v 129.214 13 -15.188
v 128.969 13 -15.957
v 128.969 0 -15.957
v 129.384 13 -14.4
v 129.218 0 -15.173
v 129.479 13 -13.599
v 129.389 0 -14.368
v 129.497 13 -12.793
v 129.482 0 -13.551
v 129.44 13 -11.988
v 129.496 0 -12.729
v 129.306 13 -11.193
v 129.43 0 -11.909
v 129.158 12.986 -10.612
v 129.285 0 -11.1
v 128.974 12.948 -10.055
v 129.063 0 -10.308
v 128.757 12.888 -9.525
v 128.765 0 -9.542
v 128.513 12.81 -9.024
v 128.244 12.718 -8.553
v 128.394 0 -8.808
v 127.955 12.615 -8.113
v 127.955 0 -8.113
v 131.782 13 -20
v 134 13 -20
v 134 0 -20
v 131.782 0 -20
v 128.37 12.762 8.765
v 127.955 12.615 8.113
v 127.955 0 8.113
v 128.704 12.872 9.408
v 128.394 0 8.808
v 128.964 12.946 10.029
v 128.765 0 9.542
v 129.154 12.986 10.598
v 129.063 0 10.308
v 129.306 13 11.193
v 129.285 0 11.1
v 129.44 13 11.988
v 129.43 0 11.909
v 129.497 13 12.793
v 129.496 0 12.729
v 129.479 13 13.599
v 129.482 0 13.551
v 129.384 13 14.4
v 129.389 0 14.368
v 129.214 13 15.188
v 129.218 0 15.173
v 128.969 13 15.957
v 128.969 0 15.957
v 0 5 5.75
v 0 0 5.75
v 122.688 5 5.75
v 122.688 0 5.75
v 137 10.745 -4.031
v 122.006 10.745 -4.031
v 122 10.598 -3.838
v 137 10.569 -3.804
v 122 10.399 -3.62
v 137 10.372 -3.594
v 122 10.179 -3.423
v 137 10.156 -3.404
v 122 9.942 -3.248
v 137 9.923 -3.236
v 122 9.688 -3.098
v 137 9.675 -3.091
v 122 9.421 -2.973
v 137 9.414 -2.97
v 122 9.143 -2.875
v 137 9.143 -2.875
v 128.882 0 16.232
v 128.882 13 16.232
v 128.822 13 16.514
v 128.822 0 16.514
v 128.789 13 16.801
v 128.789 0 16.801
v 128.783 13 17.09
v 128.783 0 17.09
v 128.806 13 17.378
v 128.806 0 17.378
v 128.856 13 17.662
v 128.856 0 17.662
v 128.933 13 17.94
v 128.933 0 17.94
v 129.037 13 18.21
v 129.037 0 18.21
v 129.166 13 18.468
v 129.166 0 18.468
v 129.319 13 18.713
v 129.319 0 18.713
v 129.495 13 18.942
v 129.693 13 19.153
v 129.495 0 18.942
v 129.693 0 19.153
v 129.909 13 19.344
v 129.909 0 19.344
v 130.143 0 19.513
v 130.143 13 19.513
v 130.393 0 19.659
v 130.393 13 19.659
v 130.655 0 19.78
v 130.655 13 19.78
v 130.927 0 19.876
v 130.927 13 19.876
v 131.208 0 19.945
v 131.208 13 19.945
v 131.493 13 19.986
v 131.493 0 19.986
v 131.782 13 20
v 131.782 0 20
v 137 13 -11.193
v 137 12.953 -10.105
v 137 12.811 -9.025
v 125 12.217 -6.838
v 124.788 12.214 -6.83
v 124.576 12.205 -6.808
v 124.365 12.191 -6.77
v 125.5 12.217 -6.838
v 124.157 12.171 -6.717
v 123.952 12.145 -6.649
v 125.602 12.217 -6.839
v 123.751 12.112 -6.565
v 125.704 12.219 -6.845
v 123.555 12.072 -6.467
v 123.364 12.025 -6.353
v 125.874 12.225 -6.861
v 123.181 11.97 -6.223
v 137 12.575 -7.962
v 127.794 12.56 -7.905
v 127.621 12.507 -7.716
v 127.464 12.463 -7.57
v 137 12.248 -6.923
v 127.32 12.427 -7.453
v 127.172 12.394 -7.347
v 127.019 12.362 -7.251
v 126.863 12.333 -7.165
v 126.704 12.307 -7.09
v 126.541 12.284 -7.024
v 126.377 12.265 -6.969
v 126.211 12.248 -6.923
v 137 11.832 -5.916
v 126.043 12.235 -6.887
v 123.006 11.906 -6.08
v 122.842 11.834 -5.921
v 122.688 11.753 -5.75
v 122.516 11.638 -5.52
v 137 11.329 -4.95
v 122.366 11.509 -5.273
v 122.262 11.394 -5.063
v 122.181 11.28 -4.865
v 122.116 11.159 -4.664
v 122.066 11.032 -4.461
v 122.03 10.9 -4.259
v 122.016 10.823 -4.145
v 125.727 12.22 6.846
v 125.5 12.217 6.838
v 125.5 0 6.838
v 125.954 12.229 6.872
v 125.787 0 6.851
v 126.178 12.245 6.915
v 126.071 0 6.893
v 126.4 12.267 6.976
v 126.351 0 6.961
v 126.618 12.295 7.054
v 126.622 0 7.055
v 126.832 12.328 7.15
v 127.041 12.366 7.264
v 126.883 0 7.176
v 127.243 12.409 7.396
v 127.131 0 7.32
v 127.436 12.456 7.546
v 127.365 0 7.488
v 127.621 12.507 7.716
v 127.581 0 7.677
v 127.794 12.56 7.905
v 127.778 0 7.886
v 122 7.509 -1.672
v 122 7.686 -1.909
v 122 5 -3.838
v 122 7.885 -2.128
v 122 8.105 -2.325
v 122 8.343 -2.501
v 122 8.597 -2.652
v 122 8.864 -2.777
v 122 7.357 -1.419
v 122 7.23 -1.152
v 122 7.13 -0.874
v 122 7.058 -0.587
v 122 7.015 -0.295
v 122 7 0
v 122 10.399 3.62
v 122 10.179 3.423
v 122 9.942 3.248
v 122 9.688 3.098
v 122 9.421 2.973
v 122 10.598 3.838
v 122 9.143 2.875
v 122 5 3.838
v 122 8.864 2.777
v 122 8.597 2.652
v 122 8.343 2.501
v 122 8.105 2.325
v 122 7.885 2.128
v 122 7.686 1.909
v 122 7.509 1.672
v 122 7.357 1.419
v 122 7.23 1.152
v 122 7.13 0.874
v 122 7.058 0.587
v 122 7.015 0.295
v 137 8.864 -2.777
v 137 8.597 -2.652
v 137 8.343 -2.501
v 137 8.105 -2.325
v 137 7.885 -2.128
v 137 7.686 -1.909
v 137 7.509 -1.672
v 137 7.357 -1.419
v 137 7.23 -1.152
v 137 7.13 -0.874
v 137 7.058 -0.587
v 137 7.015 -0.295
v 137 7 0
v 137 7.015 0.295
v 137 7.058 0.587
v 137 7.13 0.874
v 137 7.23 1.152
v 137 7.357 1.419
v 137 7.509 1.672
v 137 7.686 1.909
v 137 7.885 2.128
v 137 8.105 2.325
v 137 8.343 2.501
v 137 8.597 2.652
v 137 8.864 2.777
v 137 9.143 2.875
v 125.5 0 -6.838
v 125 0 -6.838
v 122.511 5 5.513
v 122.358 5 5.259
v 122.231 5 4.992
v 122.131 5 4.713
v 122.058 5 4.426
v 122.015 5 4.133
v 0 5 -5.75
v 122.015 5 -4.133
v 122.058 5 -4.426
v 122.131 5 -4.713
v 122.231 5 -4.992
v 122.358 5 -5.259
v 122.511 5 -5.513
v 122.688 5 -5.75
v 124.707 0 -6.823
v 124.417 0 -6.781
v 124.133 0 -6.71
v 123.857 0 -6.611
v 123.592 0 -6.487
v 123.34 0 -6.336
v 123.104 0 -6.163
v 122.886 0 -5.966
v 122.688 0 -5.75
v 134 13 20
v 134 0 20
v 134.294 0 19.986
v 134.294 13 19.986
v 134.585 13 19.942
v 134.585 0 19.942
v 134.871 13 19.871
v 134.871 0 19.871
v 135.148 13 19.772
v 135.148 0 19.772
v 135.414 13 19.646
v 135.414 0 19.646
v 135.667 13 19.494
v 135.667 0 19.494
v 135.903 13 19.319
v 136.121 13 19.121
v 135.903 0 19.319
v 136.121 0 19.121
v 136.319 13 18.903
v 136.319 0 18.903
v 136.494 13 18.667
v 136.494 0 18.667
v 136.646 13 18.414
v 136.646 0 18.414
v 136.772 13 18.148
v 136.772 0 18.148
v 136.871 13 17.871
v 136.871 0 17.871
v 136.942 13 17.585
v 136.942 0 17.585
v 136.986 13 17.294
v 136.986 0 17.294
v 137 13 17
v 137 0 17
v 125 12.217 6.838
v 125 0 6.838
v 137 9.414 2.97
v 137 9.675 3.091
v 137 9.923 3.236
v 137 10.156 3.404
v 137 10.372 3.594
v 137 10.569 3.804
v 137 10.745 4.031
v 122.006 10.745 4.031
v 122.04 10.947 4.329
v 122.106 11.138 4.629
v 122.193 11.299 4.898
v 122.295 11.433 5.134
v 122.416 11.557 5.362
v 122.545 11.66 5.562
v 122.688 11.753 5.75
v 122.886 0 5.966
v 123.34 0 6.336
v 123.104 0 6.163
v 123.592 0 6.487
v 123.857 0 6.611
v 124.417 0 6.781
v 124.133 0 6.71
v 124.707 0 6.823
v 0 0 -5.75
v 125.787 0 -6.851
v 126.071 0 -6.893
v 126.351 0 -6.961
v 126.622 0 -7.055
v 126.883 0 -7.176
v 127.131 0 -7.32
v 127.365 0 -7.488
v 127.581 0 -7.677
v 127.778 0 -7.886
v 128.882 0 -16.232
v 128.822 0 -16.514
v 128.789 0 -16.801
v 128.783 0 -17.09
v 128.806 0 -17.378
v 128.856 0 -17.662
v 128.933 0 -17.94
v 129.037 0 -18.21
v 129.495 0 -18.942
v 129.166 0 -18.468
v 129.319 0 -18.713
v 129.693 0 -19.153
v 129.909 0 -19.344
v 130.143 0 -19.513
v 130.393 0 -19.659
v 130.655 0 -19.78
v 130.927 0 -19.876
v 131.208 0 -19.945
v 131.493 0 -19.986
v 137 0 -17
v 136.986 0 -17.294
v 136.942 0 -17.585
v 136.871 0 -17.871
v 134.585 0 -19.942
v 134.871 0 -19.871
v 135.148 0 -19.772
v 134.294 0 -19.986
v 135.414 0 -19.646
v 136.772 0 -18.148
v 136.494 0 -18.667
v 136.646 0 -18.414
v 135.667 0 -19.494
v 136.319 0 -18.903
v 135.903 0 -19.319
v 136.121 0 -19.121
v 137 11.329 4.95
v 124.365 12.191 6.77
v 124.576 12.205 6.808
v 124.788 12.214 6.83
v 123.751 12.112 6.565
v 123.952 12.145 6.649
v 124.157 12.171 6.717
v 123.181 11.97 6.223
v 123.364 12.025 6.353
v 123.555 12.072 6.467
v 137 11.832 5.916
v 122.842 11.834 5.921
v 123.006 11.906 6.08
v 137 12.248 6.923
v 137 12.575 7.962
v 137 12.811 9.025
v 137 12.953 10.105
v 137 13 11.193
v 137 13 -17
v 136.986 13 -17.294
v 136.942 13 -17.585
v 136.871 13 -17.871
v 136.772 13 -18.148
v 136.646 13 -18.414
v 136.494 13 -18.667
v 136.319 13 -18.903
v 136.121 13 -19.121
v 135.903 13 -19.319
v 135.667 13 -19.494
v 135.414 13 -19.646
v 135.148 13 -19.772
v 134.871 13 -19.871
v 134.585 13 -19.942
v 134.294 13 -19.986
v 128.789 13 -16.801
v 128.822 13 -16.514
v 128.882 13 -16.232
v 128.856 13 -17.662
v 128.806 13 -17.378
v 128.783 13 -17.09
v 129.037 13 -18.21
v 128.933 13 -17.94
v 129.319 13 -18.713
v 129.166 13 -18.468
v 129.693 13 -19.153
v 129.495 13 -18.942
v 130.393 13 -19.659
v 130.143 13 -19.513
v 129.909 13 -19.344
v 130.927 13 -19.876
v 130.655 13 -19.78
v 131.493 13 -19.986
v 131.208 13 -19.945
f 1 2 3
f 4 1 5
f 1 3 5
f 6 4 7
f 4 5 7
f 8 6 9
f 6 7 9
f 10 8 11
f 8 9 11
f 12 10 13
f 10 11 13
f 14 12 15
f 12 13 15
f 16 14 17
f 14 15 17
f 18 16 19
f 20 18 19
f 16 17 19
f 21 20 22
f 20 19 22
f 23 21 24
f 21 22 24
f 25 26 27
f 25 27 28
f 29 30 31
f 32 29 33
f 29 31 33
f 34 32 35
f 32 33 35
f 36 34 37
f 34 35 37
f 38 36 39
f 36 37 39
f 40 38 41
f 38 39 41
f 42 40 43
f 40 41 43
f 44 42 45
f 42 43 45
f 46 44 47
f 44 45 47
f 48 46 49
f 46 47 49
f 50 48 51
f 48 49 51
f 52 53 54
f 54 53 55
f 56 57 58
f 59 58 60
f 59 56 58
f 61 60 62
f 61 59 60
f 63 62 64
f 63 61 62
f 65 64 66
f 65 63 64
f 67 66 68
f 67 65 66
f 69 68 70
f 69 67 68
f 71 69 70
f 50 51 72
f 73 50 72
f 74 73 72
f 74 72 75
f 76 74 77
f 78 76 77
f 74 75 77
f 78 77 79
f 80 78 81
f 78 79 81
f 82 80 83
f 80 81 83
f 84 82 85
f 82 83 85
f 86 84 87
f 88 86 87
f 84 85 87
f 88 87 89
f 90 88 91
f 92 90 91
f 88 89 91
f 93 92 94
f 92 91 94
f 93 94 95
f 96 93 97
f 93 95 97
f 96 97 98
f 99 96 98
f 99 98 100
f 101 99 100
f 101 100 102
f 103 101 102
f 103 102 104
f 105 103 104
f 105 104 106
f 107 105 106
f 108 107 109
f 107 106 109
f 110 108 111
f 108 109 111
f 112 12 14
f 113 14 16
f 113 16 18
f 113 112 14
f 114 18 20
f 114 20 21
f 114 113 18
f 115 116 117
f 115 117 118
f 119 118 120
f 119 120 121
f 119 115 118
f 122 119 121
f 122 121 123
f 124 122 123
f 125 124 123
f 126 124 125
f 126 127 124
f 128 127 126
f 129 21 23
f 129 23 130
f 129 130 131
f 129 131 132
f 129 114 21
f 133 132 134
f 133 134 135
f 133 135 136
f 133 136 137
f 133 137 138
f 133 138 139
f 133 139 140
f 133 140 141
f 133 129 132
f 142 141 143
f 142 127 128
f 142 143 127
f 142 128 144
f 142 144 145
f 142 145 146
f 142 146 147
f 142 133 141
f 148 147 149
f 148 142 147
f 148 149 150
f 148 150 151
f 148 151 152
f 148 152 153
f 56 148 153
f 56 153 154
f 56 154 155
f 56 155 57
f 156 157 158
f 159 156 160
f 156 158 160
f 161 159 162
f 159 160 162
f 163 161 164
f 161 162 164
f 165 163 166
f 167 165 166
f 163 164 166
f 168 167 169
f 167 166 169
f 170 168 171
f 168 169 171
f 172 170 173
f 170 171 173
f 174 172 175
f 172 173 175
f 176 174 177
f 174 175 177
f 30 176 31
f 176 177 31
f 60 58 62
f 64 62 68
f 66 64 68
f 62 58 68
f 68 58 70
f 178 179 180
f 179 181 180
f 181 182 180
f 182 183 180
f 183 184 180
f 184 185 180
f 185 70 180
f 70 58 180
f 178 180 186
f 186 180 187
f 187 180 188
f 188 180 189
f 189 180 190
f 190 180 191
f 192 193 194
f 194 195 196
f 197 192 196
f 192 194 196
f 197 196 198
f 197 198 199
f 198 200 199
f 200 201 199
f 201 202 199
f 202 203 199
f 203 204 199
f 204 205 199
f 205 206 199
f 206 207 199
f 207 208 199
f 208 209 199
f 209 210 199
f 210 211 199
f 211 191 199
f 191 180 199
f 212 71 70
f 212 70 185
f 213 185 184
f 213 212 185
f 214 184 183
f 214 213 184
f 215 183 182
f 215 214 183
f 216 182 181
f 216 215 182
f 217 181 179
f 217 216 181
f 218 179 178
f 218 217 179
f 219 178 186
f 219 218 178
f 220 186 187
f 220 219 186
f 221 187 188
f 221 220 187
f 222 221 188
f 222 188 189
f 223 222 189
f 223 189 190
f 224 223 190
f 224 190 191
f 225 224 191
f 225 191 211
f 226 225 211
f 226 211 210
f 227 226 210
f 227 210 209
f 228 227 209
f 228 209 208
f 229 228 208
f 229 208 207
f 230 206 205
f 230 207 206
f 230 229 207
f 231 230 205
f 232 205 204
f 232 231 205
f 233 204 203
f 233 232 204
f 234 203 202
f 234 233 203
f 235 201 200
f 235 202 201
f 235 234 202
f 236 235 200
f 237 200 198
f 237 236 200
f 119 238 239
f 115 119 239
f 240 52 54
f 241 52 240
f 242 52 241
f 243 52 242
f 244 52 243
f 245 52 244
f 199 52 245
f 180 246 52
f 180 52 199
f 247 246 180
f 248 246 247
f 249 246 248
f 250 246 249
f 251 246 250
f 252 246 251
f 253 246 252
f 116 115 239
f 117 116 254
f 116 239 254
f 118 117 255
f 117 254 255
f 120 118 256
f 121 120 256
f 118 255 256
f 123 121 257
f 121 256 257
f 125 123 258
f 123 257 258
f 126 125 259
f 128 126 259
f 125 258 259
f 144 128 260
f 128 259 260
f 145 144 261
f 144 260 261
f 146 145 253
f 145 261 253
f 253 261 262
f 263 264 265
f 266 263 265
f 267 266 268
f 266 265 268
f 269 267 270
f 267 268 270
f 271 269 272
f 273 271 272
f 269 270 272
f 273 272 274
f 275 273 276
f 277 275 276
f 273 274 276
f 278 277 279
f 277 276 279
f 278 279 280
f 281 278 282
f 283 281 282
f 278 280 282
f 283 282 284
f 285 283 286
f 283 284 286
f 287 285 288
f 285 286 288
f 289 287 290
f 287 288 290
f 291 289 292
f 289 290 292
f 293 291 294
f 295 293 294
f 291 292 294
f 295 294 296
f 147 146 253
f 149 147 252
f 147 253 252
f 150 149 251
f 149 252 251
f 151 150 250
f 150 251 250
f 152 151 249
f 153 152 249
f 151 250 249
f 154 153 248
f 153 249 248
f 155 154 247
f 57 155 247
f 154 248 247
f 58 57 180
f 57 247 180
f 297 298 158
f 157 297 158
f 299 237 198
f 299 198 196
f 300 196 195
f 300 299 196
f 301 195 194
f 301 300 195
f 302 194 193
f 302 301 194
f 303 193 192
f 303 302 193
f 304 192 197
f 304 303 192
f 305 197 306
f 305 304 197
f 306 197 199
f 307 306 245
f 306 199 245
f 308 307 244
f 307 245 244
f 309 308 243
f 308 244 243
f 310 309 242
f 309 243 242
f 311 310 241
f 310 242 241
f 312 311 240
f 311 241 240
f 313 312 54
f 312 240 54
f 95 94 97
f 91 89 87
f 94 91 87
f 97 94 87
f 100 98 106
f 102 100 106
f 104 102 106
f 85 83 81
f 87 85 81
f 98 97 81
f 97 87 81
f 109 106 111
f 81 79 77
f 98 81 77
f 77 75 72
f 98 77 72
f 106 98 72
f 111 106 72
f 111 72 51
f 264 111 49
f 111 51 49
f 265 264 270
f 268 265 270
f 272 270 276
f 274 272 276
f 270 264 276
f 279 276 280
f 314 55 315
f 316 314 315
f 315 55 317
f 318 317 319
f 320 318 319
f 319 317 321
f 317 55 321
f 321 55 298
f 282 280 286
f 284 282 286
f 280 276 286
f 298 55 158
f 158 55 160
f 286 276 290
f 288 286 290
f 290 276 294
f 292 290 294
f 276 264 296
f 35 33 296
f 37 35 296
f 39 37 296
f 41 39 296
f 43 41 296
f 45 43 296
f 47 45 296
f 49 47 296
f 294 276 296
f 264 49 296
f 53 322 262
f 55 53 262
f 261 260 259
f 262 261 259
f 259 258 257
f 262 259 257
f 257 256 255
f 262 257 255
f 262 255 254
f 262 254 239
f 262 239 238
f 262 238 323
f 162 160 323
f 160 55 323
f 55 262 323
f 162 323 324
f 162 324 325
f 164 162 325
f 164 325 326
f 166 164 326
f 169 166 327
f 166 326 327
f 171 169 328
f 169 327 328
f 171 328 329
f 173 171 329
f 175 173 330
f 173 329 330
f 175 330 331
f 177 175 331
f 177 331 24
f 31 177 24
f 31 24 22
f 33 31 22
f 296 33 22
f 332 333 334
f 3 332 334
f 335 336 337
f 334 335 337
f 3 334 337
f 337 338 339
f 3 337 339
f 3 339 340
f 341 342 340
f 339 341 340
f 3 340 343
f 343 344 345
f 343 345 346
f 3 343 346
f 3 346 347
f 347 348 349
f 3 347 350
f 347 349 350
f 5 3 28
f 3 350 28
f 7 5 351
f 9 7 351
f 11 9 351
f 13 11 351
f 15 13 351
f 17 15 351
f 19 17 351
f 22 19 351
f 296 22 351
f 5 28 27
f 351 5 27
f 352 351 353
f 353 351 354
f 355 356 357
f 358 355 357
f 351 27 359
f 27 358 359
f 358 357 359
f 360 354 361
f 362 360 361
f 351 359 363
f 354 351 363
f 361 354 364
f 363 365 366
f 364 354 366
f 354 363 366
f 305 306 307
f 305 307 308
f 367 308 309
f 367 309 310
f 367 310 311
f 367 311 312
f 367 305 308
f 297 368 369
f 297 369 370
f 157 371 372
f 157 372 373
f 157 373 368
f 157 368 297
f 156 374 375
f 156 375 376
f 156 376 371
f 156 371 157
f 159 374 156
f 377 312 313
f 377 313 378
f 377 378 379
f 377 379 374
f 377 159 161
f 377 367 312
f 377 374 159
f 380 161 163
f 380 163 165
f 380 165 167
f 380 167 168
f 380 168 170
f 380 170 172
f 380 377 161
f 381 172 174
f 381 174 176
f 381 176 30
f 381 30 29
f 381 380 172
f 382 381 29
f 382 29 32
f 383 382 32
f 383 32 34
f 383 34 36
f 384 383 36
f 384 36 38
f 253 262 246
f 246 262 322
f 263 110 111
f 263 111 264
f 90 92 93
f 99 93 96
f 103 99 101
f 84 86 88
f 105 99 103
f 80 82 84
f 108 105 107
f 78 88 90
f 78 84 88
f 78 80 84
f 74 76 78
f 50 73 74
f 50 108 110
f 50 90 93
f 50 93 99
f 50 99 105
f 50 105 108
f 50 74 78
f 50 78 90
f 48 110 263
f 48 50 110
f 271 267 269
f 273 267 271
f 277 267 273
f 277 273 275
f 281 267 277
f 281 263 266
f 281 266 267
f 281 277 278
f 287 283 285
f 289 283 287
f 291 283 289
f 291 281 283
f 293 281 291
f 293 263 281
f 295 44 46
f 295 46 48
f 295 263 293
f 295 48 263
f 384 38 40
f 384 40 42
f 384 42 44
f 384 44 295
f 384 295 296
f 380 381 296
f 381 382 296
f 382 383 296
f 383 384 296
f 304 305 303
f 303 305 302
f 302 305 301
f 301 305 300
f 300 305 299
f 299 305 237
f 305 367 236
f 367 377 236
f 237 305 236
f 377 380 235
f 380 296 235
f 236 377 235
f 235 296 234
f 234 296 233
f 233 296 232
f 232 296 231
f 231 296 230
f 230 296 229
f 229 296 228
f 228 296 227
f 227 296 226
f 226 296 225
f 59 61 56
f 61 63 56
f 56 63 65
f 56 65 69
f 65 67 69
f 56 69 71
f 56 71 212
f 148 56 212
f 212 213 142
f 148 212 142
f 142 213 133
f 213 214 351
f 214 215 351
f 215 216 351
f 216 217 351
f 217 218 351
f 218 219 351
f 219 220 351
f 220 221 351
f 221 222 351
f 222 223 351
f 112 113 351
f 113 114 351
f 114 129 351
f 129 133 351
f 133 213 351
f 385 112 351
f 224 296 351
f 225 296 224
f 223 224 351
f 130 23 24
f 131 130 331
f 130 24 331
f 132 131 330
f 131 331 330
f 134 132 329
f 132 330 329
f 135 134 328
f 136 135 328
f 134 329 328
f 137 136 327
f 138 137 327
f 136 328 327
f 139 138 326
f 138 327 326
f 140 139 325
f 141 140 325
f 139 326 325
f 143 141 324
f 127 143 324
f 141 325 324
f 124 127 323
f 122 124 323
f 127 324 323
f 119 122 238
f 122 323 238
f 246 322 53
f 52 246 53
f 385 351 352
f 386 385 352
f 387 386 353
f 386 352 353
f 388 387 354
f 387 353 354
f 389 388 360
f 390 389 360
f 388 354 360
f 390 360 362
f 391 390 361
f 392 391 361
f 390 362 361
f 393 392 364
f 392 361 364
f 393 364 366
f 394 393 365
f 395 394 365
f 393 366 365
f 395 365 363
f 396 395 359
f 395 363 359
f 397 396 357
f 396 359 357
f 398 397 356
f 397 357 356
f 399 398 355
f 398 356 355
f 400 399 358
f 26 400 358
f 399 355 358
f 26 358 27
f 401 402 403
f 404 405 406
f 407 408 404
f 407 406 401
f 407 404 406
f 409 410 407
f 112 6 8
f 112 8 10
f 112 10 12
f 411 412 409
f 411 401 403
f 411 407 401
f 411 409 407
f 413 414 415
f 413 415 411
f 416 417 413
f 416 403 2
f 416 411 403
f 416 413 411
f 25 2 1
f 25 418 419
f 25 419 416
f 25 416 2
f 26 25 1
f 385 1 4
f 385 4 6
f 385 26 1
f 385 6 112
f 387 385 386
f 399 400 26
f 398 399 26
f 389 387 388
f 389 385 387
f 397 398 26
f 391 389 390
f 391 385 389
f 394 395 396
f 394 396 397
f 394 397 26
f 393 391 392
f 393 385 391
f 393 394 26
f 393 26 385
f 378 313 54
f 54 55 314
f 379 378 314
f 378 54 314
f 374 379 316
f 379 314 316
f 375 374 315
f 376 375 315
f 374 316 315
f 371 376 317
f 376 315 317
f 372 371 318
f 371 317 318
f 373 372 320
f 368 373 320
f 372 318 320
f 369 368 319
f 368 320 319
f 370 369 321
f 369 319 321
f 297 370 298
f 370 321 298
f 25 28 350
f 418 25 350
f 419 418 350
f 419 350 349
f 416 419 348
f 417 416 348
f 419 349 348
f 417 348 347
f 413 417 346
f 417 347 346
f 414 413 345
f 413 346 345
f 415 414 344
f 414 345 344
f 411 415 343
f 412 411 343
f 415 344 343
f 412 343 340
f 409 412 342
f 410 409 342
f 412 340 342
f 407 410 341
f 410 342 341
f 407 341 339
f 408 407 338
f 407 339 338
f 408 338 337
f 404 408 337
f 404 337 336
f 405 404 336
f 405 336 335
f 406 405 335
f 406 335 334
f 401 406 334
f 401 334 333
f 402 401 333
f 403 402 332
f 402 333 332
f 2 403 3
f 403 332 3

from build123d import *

# Parameters (mm, degrees)
EXTRUDE_1_DEPTH     = 13
EXTRUDE_2_DEPTH     = 5
CUT_EXTRUDE_1_DEPTH = 140.061137634


with BuildPart() as part:
    # 草图1 → 凸台-拉伸1 (new body)
    with BuildSketch(Plane(origin=(0, 0, 0), x_dir=(1, 0, 0), z_dir=(0, 1, 0))):
        with BuildLine():
            Line((122, 3.83772234), (122, -3.83772234))
            ThreePointArc((122, -3.83772234), (122.878679656, -5.959042683), (125, -6.83772234))
            Line((125, -6.83772234), (125.5, -6.83772234))
            ThreePointArc((125.5, -6.83772234), (126.882997438, -7.175520603), (127.954545455, -8.112843616))
            ThreePointArc((127.954545455, -8.112843616), (129.429754152, -11.909474928), (128.969252111, -15.956521739))
            ThreePointArc((128.969252111, -15.956521739), (129.319163119, -18.713120722), (131.781929326, -20))
            Line((131.781929326, -20), (134, -20))
            ThreePointArc((134, -20), (136.121320344, -19.121320344), (137, -17))
            Line((137, -17), (137, 17))
            ThreePointArc((137, 17), (136.121320344, 19.121320344), (134, 20))
            Line((134, 20), (131.781929326, 20))
            ThreePointArc((131.781929326, 20), (129.319163119, 18.713120722), (128.969252111, 15.956521739))
            ThreePointArc((128.969252111, 15.956521739), (129.429754152, 11.909474928), (127.954545455, 8.112843616))
            ThreePointArc((127.954545455, 8.112843616), (126.882997438, 7.175520603), (125.5, 6.83772234))
            Line((125.5, 6.83772234), (125, 6.83772234))
            ThreePointArc((125, 6.83772234), (122.878679656, 5.959042683), (122, 3.83772234))
        make_face()
    extrude(amount=EXTRUDE_1_DEPTH)

    # 草图1<3> → 凸台-拉伸2 (add)
    with BuildSketch(Plane(origin=(0, 0, 0), x_dir=(1, 0, 0), z_dir=(0, 1, 0))):
        with BuildLine():
            Line((0, 5.75), (0, -5.75))
            Line((0, -5.75), (122.68846498, -5.75))
            ThreePointArc((122.68846498, -5.75), (122.177358944, -4.853939575), (122, -3.83772234))
            Line((122, -3.83772234), (122, 3.83772234))
            ThreePointArc((122, 3.83772234), (122.177358944, 4.853939575), (122.68846498, 5.75))
            Line((122.68846498, 5.75), (0, 5.75))
        make_face()
    extrude(amount=EXTRUDE_2_DEPTH)

    # 草图2 → 切除-拉伸1 (cut, through all)
    with BuildSketch(Plane(origin=(137, 0, 0), x_dir=(0, 0, -1), z_dir=(1, 0, 0))):
        with BuildLine():
            Line((-11.193056067, 13), (11.193056067, 13))
            ThreePointArc((11.193056067, 13), (7.438767237, 12.422890395), (4.031140189, 10.74485046))
            ThreePointArc((4.031140189, 10.74485046), (3.317442984, 10.041838714), (2.875, 9.143043175))
            ThreePointArc((2.875, 9.143043175), (0, 7), (-2.875, 9.143043175))
            ThreePointArc((-2.875, 9.143043175), (-3.317442984, 10.041838714), (-4.031140189, 10.74485046))
            ThreePointArc((-4.031140189, 10.74485046), (-7.438767237, 12.422890395), (-11.193056067, 13))
        make_face()
    extrude(amount=-CUT_EXTRUDE_1_DEPTH, mode=Mode.SUBTRACT)


solid = part.part
